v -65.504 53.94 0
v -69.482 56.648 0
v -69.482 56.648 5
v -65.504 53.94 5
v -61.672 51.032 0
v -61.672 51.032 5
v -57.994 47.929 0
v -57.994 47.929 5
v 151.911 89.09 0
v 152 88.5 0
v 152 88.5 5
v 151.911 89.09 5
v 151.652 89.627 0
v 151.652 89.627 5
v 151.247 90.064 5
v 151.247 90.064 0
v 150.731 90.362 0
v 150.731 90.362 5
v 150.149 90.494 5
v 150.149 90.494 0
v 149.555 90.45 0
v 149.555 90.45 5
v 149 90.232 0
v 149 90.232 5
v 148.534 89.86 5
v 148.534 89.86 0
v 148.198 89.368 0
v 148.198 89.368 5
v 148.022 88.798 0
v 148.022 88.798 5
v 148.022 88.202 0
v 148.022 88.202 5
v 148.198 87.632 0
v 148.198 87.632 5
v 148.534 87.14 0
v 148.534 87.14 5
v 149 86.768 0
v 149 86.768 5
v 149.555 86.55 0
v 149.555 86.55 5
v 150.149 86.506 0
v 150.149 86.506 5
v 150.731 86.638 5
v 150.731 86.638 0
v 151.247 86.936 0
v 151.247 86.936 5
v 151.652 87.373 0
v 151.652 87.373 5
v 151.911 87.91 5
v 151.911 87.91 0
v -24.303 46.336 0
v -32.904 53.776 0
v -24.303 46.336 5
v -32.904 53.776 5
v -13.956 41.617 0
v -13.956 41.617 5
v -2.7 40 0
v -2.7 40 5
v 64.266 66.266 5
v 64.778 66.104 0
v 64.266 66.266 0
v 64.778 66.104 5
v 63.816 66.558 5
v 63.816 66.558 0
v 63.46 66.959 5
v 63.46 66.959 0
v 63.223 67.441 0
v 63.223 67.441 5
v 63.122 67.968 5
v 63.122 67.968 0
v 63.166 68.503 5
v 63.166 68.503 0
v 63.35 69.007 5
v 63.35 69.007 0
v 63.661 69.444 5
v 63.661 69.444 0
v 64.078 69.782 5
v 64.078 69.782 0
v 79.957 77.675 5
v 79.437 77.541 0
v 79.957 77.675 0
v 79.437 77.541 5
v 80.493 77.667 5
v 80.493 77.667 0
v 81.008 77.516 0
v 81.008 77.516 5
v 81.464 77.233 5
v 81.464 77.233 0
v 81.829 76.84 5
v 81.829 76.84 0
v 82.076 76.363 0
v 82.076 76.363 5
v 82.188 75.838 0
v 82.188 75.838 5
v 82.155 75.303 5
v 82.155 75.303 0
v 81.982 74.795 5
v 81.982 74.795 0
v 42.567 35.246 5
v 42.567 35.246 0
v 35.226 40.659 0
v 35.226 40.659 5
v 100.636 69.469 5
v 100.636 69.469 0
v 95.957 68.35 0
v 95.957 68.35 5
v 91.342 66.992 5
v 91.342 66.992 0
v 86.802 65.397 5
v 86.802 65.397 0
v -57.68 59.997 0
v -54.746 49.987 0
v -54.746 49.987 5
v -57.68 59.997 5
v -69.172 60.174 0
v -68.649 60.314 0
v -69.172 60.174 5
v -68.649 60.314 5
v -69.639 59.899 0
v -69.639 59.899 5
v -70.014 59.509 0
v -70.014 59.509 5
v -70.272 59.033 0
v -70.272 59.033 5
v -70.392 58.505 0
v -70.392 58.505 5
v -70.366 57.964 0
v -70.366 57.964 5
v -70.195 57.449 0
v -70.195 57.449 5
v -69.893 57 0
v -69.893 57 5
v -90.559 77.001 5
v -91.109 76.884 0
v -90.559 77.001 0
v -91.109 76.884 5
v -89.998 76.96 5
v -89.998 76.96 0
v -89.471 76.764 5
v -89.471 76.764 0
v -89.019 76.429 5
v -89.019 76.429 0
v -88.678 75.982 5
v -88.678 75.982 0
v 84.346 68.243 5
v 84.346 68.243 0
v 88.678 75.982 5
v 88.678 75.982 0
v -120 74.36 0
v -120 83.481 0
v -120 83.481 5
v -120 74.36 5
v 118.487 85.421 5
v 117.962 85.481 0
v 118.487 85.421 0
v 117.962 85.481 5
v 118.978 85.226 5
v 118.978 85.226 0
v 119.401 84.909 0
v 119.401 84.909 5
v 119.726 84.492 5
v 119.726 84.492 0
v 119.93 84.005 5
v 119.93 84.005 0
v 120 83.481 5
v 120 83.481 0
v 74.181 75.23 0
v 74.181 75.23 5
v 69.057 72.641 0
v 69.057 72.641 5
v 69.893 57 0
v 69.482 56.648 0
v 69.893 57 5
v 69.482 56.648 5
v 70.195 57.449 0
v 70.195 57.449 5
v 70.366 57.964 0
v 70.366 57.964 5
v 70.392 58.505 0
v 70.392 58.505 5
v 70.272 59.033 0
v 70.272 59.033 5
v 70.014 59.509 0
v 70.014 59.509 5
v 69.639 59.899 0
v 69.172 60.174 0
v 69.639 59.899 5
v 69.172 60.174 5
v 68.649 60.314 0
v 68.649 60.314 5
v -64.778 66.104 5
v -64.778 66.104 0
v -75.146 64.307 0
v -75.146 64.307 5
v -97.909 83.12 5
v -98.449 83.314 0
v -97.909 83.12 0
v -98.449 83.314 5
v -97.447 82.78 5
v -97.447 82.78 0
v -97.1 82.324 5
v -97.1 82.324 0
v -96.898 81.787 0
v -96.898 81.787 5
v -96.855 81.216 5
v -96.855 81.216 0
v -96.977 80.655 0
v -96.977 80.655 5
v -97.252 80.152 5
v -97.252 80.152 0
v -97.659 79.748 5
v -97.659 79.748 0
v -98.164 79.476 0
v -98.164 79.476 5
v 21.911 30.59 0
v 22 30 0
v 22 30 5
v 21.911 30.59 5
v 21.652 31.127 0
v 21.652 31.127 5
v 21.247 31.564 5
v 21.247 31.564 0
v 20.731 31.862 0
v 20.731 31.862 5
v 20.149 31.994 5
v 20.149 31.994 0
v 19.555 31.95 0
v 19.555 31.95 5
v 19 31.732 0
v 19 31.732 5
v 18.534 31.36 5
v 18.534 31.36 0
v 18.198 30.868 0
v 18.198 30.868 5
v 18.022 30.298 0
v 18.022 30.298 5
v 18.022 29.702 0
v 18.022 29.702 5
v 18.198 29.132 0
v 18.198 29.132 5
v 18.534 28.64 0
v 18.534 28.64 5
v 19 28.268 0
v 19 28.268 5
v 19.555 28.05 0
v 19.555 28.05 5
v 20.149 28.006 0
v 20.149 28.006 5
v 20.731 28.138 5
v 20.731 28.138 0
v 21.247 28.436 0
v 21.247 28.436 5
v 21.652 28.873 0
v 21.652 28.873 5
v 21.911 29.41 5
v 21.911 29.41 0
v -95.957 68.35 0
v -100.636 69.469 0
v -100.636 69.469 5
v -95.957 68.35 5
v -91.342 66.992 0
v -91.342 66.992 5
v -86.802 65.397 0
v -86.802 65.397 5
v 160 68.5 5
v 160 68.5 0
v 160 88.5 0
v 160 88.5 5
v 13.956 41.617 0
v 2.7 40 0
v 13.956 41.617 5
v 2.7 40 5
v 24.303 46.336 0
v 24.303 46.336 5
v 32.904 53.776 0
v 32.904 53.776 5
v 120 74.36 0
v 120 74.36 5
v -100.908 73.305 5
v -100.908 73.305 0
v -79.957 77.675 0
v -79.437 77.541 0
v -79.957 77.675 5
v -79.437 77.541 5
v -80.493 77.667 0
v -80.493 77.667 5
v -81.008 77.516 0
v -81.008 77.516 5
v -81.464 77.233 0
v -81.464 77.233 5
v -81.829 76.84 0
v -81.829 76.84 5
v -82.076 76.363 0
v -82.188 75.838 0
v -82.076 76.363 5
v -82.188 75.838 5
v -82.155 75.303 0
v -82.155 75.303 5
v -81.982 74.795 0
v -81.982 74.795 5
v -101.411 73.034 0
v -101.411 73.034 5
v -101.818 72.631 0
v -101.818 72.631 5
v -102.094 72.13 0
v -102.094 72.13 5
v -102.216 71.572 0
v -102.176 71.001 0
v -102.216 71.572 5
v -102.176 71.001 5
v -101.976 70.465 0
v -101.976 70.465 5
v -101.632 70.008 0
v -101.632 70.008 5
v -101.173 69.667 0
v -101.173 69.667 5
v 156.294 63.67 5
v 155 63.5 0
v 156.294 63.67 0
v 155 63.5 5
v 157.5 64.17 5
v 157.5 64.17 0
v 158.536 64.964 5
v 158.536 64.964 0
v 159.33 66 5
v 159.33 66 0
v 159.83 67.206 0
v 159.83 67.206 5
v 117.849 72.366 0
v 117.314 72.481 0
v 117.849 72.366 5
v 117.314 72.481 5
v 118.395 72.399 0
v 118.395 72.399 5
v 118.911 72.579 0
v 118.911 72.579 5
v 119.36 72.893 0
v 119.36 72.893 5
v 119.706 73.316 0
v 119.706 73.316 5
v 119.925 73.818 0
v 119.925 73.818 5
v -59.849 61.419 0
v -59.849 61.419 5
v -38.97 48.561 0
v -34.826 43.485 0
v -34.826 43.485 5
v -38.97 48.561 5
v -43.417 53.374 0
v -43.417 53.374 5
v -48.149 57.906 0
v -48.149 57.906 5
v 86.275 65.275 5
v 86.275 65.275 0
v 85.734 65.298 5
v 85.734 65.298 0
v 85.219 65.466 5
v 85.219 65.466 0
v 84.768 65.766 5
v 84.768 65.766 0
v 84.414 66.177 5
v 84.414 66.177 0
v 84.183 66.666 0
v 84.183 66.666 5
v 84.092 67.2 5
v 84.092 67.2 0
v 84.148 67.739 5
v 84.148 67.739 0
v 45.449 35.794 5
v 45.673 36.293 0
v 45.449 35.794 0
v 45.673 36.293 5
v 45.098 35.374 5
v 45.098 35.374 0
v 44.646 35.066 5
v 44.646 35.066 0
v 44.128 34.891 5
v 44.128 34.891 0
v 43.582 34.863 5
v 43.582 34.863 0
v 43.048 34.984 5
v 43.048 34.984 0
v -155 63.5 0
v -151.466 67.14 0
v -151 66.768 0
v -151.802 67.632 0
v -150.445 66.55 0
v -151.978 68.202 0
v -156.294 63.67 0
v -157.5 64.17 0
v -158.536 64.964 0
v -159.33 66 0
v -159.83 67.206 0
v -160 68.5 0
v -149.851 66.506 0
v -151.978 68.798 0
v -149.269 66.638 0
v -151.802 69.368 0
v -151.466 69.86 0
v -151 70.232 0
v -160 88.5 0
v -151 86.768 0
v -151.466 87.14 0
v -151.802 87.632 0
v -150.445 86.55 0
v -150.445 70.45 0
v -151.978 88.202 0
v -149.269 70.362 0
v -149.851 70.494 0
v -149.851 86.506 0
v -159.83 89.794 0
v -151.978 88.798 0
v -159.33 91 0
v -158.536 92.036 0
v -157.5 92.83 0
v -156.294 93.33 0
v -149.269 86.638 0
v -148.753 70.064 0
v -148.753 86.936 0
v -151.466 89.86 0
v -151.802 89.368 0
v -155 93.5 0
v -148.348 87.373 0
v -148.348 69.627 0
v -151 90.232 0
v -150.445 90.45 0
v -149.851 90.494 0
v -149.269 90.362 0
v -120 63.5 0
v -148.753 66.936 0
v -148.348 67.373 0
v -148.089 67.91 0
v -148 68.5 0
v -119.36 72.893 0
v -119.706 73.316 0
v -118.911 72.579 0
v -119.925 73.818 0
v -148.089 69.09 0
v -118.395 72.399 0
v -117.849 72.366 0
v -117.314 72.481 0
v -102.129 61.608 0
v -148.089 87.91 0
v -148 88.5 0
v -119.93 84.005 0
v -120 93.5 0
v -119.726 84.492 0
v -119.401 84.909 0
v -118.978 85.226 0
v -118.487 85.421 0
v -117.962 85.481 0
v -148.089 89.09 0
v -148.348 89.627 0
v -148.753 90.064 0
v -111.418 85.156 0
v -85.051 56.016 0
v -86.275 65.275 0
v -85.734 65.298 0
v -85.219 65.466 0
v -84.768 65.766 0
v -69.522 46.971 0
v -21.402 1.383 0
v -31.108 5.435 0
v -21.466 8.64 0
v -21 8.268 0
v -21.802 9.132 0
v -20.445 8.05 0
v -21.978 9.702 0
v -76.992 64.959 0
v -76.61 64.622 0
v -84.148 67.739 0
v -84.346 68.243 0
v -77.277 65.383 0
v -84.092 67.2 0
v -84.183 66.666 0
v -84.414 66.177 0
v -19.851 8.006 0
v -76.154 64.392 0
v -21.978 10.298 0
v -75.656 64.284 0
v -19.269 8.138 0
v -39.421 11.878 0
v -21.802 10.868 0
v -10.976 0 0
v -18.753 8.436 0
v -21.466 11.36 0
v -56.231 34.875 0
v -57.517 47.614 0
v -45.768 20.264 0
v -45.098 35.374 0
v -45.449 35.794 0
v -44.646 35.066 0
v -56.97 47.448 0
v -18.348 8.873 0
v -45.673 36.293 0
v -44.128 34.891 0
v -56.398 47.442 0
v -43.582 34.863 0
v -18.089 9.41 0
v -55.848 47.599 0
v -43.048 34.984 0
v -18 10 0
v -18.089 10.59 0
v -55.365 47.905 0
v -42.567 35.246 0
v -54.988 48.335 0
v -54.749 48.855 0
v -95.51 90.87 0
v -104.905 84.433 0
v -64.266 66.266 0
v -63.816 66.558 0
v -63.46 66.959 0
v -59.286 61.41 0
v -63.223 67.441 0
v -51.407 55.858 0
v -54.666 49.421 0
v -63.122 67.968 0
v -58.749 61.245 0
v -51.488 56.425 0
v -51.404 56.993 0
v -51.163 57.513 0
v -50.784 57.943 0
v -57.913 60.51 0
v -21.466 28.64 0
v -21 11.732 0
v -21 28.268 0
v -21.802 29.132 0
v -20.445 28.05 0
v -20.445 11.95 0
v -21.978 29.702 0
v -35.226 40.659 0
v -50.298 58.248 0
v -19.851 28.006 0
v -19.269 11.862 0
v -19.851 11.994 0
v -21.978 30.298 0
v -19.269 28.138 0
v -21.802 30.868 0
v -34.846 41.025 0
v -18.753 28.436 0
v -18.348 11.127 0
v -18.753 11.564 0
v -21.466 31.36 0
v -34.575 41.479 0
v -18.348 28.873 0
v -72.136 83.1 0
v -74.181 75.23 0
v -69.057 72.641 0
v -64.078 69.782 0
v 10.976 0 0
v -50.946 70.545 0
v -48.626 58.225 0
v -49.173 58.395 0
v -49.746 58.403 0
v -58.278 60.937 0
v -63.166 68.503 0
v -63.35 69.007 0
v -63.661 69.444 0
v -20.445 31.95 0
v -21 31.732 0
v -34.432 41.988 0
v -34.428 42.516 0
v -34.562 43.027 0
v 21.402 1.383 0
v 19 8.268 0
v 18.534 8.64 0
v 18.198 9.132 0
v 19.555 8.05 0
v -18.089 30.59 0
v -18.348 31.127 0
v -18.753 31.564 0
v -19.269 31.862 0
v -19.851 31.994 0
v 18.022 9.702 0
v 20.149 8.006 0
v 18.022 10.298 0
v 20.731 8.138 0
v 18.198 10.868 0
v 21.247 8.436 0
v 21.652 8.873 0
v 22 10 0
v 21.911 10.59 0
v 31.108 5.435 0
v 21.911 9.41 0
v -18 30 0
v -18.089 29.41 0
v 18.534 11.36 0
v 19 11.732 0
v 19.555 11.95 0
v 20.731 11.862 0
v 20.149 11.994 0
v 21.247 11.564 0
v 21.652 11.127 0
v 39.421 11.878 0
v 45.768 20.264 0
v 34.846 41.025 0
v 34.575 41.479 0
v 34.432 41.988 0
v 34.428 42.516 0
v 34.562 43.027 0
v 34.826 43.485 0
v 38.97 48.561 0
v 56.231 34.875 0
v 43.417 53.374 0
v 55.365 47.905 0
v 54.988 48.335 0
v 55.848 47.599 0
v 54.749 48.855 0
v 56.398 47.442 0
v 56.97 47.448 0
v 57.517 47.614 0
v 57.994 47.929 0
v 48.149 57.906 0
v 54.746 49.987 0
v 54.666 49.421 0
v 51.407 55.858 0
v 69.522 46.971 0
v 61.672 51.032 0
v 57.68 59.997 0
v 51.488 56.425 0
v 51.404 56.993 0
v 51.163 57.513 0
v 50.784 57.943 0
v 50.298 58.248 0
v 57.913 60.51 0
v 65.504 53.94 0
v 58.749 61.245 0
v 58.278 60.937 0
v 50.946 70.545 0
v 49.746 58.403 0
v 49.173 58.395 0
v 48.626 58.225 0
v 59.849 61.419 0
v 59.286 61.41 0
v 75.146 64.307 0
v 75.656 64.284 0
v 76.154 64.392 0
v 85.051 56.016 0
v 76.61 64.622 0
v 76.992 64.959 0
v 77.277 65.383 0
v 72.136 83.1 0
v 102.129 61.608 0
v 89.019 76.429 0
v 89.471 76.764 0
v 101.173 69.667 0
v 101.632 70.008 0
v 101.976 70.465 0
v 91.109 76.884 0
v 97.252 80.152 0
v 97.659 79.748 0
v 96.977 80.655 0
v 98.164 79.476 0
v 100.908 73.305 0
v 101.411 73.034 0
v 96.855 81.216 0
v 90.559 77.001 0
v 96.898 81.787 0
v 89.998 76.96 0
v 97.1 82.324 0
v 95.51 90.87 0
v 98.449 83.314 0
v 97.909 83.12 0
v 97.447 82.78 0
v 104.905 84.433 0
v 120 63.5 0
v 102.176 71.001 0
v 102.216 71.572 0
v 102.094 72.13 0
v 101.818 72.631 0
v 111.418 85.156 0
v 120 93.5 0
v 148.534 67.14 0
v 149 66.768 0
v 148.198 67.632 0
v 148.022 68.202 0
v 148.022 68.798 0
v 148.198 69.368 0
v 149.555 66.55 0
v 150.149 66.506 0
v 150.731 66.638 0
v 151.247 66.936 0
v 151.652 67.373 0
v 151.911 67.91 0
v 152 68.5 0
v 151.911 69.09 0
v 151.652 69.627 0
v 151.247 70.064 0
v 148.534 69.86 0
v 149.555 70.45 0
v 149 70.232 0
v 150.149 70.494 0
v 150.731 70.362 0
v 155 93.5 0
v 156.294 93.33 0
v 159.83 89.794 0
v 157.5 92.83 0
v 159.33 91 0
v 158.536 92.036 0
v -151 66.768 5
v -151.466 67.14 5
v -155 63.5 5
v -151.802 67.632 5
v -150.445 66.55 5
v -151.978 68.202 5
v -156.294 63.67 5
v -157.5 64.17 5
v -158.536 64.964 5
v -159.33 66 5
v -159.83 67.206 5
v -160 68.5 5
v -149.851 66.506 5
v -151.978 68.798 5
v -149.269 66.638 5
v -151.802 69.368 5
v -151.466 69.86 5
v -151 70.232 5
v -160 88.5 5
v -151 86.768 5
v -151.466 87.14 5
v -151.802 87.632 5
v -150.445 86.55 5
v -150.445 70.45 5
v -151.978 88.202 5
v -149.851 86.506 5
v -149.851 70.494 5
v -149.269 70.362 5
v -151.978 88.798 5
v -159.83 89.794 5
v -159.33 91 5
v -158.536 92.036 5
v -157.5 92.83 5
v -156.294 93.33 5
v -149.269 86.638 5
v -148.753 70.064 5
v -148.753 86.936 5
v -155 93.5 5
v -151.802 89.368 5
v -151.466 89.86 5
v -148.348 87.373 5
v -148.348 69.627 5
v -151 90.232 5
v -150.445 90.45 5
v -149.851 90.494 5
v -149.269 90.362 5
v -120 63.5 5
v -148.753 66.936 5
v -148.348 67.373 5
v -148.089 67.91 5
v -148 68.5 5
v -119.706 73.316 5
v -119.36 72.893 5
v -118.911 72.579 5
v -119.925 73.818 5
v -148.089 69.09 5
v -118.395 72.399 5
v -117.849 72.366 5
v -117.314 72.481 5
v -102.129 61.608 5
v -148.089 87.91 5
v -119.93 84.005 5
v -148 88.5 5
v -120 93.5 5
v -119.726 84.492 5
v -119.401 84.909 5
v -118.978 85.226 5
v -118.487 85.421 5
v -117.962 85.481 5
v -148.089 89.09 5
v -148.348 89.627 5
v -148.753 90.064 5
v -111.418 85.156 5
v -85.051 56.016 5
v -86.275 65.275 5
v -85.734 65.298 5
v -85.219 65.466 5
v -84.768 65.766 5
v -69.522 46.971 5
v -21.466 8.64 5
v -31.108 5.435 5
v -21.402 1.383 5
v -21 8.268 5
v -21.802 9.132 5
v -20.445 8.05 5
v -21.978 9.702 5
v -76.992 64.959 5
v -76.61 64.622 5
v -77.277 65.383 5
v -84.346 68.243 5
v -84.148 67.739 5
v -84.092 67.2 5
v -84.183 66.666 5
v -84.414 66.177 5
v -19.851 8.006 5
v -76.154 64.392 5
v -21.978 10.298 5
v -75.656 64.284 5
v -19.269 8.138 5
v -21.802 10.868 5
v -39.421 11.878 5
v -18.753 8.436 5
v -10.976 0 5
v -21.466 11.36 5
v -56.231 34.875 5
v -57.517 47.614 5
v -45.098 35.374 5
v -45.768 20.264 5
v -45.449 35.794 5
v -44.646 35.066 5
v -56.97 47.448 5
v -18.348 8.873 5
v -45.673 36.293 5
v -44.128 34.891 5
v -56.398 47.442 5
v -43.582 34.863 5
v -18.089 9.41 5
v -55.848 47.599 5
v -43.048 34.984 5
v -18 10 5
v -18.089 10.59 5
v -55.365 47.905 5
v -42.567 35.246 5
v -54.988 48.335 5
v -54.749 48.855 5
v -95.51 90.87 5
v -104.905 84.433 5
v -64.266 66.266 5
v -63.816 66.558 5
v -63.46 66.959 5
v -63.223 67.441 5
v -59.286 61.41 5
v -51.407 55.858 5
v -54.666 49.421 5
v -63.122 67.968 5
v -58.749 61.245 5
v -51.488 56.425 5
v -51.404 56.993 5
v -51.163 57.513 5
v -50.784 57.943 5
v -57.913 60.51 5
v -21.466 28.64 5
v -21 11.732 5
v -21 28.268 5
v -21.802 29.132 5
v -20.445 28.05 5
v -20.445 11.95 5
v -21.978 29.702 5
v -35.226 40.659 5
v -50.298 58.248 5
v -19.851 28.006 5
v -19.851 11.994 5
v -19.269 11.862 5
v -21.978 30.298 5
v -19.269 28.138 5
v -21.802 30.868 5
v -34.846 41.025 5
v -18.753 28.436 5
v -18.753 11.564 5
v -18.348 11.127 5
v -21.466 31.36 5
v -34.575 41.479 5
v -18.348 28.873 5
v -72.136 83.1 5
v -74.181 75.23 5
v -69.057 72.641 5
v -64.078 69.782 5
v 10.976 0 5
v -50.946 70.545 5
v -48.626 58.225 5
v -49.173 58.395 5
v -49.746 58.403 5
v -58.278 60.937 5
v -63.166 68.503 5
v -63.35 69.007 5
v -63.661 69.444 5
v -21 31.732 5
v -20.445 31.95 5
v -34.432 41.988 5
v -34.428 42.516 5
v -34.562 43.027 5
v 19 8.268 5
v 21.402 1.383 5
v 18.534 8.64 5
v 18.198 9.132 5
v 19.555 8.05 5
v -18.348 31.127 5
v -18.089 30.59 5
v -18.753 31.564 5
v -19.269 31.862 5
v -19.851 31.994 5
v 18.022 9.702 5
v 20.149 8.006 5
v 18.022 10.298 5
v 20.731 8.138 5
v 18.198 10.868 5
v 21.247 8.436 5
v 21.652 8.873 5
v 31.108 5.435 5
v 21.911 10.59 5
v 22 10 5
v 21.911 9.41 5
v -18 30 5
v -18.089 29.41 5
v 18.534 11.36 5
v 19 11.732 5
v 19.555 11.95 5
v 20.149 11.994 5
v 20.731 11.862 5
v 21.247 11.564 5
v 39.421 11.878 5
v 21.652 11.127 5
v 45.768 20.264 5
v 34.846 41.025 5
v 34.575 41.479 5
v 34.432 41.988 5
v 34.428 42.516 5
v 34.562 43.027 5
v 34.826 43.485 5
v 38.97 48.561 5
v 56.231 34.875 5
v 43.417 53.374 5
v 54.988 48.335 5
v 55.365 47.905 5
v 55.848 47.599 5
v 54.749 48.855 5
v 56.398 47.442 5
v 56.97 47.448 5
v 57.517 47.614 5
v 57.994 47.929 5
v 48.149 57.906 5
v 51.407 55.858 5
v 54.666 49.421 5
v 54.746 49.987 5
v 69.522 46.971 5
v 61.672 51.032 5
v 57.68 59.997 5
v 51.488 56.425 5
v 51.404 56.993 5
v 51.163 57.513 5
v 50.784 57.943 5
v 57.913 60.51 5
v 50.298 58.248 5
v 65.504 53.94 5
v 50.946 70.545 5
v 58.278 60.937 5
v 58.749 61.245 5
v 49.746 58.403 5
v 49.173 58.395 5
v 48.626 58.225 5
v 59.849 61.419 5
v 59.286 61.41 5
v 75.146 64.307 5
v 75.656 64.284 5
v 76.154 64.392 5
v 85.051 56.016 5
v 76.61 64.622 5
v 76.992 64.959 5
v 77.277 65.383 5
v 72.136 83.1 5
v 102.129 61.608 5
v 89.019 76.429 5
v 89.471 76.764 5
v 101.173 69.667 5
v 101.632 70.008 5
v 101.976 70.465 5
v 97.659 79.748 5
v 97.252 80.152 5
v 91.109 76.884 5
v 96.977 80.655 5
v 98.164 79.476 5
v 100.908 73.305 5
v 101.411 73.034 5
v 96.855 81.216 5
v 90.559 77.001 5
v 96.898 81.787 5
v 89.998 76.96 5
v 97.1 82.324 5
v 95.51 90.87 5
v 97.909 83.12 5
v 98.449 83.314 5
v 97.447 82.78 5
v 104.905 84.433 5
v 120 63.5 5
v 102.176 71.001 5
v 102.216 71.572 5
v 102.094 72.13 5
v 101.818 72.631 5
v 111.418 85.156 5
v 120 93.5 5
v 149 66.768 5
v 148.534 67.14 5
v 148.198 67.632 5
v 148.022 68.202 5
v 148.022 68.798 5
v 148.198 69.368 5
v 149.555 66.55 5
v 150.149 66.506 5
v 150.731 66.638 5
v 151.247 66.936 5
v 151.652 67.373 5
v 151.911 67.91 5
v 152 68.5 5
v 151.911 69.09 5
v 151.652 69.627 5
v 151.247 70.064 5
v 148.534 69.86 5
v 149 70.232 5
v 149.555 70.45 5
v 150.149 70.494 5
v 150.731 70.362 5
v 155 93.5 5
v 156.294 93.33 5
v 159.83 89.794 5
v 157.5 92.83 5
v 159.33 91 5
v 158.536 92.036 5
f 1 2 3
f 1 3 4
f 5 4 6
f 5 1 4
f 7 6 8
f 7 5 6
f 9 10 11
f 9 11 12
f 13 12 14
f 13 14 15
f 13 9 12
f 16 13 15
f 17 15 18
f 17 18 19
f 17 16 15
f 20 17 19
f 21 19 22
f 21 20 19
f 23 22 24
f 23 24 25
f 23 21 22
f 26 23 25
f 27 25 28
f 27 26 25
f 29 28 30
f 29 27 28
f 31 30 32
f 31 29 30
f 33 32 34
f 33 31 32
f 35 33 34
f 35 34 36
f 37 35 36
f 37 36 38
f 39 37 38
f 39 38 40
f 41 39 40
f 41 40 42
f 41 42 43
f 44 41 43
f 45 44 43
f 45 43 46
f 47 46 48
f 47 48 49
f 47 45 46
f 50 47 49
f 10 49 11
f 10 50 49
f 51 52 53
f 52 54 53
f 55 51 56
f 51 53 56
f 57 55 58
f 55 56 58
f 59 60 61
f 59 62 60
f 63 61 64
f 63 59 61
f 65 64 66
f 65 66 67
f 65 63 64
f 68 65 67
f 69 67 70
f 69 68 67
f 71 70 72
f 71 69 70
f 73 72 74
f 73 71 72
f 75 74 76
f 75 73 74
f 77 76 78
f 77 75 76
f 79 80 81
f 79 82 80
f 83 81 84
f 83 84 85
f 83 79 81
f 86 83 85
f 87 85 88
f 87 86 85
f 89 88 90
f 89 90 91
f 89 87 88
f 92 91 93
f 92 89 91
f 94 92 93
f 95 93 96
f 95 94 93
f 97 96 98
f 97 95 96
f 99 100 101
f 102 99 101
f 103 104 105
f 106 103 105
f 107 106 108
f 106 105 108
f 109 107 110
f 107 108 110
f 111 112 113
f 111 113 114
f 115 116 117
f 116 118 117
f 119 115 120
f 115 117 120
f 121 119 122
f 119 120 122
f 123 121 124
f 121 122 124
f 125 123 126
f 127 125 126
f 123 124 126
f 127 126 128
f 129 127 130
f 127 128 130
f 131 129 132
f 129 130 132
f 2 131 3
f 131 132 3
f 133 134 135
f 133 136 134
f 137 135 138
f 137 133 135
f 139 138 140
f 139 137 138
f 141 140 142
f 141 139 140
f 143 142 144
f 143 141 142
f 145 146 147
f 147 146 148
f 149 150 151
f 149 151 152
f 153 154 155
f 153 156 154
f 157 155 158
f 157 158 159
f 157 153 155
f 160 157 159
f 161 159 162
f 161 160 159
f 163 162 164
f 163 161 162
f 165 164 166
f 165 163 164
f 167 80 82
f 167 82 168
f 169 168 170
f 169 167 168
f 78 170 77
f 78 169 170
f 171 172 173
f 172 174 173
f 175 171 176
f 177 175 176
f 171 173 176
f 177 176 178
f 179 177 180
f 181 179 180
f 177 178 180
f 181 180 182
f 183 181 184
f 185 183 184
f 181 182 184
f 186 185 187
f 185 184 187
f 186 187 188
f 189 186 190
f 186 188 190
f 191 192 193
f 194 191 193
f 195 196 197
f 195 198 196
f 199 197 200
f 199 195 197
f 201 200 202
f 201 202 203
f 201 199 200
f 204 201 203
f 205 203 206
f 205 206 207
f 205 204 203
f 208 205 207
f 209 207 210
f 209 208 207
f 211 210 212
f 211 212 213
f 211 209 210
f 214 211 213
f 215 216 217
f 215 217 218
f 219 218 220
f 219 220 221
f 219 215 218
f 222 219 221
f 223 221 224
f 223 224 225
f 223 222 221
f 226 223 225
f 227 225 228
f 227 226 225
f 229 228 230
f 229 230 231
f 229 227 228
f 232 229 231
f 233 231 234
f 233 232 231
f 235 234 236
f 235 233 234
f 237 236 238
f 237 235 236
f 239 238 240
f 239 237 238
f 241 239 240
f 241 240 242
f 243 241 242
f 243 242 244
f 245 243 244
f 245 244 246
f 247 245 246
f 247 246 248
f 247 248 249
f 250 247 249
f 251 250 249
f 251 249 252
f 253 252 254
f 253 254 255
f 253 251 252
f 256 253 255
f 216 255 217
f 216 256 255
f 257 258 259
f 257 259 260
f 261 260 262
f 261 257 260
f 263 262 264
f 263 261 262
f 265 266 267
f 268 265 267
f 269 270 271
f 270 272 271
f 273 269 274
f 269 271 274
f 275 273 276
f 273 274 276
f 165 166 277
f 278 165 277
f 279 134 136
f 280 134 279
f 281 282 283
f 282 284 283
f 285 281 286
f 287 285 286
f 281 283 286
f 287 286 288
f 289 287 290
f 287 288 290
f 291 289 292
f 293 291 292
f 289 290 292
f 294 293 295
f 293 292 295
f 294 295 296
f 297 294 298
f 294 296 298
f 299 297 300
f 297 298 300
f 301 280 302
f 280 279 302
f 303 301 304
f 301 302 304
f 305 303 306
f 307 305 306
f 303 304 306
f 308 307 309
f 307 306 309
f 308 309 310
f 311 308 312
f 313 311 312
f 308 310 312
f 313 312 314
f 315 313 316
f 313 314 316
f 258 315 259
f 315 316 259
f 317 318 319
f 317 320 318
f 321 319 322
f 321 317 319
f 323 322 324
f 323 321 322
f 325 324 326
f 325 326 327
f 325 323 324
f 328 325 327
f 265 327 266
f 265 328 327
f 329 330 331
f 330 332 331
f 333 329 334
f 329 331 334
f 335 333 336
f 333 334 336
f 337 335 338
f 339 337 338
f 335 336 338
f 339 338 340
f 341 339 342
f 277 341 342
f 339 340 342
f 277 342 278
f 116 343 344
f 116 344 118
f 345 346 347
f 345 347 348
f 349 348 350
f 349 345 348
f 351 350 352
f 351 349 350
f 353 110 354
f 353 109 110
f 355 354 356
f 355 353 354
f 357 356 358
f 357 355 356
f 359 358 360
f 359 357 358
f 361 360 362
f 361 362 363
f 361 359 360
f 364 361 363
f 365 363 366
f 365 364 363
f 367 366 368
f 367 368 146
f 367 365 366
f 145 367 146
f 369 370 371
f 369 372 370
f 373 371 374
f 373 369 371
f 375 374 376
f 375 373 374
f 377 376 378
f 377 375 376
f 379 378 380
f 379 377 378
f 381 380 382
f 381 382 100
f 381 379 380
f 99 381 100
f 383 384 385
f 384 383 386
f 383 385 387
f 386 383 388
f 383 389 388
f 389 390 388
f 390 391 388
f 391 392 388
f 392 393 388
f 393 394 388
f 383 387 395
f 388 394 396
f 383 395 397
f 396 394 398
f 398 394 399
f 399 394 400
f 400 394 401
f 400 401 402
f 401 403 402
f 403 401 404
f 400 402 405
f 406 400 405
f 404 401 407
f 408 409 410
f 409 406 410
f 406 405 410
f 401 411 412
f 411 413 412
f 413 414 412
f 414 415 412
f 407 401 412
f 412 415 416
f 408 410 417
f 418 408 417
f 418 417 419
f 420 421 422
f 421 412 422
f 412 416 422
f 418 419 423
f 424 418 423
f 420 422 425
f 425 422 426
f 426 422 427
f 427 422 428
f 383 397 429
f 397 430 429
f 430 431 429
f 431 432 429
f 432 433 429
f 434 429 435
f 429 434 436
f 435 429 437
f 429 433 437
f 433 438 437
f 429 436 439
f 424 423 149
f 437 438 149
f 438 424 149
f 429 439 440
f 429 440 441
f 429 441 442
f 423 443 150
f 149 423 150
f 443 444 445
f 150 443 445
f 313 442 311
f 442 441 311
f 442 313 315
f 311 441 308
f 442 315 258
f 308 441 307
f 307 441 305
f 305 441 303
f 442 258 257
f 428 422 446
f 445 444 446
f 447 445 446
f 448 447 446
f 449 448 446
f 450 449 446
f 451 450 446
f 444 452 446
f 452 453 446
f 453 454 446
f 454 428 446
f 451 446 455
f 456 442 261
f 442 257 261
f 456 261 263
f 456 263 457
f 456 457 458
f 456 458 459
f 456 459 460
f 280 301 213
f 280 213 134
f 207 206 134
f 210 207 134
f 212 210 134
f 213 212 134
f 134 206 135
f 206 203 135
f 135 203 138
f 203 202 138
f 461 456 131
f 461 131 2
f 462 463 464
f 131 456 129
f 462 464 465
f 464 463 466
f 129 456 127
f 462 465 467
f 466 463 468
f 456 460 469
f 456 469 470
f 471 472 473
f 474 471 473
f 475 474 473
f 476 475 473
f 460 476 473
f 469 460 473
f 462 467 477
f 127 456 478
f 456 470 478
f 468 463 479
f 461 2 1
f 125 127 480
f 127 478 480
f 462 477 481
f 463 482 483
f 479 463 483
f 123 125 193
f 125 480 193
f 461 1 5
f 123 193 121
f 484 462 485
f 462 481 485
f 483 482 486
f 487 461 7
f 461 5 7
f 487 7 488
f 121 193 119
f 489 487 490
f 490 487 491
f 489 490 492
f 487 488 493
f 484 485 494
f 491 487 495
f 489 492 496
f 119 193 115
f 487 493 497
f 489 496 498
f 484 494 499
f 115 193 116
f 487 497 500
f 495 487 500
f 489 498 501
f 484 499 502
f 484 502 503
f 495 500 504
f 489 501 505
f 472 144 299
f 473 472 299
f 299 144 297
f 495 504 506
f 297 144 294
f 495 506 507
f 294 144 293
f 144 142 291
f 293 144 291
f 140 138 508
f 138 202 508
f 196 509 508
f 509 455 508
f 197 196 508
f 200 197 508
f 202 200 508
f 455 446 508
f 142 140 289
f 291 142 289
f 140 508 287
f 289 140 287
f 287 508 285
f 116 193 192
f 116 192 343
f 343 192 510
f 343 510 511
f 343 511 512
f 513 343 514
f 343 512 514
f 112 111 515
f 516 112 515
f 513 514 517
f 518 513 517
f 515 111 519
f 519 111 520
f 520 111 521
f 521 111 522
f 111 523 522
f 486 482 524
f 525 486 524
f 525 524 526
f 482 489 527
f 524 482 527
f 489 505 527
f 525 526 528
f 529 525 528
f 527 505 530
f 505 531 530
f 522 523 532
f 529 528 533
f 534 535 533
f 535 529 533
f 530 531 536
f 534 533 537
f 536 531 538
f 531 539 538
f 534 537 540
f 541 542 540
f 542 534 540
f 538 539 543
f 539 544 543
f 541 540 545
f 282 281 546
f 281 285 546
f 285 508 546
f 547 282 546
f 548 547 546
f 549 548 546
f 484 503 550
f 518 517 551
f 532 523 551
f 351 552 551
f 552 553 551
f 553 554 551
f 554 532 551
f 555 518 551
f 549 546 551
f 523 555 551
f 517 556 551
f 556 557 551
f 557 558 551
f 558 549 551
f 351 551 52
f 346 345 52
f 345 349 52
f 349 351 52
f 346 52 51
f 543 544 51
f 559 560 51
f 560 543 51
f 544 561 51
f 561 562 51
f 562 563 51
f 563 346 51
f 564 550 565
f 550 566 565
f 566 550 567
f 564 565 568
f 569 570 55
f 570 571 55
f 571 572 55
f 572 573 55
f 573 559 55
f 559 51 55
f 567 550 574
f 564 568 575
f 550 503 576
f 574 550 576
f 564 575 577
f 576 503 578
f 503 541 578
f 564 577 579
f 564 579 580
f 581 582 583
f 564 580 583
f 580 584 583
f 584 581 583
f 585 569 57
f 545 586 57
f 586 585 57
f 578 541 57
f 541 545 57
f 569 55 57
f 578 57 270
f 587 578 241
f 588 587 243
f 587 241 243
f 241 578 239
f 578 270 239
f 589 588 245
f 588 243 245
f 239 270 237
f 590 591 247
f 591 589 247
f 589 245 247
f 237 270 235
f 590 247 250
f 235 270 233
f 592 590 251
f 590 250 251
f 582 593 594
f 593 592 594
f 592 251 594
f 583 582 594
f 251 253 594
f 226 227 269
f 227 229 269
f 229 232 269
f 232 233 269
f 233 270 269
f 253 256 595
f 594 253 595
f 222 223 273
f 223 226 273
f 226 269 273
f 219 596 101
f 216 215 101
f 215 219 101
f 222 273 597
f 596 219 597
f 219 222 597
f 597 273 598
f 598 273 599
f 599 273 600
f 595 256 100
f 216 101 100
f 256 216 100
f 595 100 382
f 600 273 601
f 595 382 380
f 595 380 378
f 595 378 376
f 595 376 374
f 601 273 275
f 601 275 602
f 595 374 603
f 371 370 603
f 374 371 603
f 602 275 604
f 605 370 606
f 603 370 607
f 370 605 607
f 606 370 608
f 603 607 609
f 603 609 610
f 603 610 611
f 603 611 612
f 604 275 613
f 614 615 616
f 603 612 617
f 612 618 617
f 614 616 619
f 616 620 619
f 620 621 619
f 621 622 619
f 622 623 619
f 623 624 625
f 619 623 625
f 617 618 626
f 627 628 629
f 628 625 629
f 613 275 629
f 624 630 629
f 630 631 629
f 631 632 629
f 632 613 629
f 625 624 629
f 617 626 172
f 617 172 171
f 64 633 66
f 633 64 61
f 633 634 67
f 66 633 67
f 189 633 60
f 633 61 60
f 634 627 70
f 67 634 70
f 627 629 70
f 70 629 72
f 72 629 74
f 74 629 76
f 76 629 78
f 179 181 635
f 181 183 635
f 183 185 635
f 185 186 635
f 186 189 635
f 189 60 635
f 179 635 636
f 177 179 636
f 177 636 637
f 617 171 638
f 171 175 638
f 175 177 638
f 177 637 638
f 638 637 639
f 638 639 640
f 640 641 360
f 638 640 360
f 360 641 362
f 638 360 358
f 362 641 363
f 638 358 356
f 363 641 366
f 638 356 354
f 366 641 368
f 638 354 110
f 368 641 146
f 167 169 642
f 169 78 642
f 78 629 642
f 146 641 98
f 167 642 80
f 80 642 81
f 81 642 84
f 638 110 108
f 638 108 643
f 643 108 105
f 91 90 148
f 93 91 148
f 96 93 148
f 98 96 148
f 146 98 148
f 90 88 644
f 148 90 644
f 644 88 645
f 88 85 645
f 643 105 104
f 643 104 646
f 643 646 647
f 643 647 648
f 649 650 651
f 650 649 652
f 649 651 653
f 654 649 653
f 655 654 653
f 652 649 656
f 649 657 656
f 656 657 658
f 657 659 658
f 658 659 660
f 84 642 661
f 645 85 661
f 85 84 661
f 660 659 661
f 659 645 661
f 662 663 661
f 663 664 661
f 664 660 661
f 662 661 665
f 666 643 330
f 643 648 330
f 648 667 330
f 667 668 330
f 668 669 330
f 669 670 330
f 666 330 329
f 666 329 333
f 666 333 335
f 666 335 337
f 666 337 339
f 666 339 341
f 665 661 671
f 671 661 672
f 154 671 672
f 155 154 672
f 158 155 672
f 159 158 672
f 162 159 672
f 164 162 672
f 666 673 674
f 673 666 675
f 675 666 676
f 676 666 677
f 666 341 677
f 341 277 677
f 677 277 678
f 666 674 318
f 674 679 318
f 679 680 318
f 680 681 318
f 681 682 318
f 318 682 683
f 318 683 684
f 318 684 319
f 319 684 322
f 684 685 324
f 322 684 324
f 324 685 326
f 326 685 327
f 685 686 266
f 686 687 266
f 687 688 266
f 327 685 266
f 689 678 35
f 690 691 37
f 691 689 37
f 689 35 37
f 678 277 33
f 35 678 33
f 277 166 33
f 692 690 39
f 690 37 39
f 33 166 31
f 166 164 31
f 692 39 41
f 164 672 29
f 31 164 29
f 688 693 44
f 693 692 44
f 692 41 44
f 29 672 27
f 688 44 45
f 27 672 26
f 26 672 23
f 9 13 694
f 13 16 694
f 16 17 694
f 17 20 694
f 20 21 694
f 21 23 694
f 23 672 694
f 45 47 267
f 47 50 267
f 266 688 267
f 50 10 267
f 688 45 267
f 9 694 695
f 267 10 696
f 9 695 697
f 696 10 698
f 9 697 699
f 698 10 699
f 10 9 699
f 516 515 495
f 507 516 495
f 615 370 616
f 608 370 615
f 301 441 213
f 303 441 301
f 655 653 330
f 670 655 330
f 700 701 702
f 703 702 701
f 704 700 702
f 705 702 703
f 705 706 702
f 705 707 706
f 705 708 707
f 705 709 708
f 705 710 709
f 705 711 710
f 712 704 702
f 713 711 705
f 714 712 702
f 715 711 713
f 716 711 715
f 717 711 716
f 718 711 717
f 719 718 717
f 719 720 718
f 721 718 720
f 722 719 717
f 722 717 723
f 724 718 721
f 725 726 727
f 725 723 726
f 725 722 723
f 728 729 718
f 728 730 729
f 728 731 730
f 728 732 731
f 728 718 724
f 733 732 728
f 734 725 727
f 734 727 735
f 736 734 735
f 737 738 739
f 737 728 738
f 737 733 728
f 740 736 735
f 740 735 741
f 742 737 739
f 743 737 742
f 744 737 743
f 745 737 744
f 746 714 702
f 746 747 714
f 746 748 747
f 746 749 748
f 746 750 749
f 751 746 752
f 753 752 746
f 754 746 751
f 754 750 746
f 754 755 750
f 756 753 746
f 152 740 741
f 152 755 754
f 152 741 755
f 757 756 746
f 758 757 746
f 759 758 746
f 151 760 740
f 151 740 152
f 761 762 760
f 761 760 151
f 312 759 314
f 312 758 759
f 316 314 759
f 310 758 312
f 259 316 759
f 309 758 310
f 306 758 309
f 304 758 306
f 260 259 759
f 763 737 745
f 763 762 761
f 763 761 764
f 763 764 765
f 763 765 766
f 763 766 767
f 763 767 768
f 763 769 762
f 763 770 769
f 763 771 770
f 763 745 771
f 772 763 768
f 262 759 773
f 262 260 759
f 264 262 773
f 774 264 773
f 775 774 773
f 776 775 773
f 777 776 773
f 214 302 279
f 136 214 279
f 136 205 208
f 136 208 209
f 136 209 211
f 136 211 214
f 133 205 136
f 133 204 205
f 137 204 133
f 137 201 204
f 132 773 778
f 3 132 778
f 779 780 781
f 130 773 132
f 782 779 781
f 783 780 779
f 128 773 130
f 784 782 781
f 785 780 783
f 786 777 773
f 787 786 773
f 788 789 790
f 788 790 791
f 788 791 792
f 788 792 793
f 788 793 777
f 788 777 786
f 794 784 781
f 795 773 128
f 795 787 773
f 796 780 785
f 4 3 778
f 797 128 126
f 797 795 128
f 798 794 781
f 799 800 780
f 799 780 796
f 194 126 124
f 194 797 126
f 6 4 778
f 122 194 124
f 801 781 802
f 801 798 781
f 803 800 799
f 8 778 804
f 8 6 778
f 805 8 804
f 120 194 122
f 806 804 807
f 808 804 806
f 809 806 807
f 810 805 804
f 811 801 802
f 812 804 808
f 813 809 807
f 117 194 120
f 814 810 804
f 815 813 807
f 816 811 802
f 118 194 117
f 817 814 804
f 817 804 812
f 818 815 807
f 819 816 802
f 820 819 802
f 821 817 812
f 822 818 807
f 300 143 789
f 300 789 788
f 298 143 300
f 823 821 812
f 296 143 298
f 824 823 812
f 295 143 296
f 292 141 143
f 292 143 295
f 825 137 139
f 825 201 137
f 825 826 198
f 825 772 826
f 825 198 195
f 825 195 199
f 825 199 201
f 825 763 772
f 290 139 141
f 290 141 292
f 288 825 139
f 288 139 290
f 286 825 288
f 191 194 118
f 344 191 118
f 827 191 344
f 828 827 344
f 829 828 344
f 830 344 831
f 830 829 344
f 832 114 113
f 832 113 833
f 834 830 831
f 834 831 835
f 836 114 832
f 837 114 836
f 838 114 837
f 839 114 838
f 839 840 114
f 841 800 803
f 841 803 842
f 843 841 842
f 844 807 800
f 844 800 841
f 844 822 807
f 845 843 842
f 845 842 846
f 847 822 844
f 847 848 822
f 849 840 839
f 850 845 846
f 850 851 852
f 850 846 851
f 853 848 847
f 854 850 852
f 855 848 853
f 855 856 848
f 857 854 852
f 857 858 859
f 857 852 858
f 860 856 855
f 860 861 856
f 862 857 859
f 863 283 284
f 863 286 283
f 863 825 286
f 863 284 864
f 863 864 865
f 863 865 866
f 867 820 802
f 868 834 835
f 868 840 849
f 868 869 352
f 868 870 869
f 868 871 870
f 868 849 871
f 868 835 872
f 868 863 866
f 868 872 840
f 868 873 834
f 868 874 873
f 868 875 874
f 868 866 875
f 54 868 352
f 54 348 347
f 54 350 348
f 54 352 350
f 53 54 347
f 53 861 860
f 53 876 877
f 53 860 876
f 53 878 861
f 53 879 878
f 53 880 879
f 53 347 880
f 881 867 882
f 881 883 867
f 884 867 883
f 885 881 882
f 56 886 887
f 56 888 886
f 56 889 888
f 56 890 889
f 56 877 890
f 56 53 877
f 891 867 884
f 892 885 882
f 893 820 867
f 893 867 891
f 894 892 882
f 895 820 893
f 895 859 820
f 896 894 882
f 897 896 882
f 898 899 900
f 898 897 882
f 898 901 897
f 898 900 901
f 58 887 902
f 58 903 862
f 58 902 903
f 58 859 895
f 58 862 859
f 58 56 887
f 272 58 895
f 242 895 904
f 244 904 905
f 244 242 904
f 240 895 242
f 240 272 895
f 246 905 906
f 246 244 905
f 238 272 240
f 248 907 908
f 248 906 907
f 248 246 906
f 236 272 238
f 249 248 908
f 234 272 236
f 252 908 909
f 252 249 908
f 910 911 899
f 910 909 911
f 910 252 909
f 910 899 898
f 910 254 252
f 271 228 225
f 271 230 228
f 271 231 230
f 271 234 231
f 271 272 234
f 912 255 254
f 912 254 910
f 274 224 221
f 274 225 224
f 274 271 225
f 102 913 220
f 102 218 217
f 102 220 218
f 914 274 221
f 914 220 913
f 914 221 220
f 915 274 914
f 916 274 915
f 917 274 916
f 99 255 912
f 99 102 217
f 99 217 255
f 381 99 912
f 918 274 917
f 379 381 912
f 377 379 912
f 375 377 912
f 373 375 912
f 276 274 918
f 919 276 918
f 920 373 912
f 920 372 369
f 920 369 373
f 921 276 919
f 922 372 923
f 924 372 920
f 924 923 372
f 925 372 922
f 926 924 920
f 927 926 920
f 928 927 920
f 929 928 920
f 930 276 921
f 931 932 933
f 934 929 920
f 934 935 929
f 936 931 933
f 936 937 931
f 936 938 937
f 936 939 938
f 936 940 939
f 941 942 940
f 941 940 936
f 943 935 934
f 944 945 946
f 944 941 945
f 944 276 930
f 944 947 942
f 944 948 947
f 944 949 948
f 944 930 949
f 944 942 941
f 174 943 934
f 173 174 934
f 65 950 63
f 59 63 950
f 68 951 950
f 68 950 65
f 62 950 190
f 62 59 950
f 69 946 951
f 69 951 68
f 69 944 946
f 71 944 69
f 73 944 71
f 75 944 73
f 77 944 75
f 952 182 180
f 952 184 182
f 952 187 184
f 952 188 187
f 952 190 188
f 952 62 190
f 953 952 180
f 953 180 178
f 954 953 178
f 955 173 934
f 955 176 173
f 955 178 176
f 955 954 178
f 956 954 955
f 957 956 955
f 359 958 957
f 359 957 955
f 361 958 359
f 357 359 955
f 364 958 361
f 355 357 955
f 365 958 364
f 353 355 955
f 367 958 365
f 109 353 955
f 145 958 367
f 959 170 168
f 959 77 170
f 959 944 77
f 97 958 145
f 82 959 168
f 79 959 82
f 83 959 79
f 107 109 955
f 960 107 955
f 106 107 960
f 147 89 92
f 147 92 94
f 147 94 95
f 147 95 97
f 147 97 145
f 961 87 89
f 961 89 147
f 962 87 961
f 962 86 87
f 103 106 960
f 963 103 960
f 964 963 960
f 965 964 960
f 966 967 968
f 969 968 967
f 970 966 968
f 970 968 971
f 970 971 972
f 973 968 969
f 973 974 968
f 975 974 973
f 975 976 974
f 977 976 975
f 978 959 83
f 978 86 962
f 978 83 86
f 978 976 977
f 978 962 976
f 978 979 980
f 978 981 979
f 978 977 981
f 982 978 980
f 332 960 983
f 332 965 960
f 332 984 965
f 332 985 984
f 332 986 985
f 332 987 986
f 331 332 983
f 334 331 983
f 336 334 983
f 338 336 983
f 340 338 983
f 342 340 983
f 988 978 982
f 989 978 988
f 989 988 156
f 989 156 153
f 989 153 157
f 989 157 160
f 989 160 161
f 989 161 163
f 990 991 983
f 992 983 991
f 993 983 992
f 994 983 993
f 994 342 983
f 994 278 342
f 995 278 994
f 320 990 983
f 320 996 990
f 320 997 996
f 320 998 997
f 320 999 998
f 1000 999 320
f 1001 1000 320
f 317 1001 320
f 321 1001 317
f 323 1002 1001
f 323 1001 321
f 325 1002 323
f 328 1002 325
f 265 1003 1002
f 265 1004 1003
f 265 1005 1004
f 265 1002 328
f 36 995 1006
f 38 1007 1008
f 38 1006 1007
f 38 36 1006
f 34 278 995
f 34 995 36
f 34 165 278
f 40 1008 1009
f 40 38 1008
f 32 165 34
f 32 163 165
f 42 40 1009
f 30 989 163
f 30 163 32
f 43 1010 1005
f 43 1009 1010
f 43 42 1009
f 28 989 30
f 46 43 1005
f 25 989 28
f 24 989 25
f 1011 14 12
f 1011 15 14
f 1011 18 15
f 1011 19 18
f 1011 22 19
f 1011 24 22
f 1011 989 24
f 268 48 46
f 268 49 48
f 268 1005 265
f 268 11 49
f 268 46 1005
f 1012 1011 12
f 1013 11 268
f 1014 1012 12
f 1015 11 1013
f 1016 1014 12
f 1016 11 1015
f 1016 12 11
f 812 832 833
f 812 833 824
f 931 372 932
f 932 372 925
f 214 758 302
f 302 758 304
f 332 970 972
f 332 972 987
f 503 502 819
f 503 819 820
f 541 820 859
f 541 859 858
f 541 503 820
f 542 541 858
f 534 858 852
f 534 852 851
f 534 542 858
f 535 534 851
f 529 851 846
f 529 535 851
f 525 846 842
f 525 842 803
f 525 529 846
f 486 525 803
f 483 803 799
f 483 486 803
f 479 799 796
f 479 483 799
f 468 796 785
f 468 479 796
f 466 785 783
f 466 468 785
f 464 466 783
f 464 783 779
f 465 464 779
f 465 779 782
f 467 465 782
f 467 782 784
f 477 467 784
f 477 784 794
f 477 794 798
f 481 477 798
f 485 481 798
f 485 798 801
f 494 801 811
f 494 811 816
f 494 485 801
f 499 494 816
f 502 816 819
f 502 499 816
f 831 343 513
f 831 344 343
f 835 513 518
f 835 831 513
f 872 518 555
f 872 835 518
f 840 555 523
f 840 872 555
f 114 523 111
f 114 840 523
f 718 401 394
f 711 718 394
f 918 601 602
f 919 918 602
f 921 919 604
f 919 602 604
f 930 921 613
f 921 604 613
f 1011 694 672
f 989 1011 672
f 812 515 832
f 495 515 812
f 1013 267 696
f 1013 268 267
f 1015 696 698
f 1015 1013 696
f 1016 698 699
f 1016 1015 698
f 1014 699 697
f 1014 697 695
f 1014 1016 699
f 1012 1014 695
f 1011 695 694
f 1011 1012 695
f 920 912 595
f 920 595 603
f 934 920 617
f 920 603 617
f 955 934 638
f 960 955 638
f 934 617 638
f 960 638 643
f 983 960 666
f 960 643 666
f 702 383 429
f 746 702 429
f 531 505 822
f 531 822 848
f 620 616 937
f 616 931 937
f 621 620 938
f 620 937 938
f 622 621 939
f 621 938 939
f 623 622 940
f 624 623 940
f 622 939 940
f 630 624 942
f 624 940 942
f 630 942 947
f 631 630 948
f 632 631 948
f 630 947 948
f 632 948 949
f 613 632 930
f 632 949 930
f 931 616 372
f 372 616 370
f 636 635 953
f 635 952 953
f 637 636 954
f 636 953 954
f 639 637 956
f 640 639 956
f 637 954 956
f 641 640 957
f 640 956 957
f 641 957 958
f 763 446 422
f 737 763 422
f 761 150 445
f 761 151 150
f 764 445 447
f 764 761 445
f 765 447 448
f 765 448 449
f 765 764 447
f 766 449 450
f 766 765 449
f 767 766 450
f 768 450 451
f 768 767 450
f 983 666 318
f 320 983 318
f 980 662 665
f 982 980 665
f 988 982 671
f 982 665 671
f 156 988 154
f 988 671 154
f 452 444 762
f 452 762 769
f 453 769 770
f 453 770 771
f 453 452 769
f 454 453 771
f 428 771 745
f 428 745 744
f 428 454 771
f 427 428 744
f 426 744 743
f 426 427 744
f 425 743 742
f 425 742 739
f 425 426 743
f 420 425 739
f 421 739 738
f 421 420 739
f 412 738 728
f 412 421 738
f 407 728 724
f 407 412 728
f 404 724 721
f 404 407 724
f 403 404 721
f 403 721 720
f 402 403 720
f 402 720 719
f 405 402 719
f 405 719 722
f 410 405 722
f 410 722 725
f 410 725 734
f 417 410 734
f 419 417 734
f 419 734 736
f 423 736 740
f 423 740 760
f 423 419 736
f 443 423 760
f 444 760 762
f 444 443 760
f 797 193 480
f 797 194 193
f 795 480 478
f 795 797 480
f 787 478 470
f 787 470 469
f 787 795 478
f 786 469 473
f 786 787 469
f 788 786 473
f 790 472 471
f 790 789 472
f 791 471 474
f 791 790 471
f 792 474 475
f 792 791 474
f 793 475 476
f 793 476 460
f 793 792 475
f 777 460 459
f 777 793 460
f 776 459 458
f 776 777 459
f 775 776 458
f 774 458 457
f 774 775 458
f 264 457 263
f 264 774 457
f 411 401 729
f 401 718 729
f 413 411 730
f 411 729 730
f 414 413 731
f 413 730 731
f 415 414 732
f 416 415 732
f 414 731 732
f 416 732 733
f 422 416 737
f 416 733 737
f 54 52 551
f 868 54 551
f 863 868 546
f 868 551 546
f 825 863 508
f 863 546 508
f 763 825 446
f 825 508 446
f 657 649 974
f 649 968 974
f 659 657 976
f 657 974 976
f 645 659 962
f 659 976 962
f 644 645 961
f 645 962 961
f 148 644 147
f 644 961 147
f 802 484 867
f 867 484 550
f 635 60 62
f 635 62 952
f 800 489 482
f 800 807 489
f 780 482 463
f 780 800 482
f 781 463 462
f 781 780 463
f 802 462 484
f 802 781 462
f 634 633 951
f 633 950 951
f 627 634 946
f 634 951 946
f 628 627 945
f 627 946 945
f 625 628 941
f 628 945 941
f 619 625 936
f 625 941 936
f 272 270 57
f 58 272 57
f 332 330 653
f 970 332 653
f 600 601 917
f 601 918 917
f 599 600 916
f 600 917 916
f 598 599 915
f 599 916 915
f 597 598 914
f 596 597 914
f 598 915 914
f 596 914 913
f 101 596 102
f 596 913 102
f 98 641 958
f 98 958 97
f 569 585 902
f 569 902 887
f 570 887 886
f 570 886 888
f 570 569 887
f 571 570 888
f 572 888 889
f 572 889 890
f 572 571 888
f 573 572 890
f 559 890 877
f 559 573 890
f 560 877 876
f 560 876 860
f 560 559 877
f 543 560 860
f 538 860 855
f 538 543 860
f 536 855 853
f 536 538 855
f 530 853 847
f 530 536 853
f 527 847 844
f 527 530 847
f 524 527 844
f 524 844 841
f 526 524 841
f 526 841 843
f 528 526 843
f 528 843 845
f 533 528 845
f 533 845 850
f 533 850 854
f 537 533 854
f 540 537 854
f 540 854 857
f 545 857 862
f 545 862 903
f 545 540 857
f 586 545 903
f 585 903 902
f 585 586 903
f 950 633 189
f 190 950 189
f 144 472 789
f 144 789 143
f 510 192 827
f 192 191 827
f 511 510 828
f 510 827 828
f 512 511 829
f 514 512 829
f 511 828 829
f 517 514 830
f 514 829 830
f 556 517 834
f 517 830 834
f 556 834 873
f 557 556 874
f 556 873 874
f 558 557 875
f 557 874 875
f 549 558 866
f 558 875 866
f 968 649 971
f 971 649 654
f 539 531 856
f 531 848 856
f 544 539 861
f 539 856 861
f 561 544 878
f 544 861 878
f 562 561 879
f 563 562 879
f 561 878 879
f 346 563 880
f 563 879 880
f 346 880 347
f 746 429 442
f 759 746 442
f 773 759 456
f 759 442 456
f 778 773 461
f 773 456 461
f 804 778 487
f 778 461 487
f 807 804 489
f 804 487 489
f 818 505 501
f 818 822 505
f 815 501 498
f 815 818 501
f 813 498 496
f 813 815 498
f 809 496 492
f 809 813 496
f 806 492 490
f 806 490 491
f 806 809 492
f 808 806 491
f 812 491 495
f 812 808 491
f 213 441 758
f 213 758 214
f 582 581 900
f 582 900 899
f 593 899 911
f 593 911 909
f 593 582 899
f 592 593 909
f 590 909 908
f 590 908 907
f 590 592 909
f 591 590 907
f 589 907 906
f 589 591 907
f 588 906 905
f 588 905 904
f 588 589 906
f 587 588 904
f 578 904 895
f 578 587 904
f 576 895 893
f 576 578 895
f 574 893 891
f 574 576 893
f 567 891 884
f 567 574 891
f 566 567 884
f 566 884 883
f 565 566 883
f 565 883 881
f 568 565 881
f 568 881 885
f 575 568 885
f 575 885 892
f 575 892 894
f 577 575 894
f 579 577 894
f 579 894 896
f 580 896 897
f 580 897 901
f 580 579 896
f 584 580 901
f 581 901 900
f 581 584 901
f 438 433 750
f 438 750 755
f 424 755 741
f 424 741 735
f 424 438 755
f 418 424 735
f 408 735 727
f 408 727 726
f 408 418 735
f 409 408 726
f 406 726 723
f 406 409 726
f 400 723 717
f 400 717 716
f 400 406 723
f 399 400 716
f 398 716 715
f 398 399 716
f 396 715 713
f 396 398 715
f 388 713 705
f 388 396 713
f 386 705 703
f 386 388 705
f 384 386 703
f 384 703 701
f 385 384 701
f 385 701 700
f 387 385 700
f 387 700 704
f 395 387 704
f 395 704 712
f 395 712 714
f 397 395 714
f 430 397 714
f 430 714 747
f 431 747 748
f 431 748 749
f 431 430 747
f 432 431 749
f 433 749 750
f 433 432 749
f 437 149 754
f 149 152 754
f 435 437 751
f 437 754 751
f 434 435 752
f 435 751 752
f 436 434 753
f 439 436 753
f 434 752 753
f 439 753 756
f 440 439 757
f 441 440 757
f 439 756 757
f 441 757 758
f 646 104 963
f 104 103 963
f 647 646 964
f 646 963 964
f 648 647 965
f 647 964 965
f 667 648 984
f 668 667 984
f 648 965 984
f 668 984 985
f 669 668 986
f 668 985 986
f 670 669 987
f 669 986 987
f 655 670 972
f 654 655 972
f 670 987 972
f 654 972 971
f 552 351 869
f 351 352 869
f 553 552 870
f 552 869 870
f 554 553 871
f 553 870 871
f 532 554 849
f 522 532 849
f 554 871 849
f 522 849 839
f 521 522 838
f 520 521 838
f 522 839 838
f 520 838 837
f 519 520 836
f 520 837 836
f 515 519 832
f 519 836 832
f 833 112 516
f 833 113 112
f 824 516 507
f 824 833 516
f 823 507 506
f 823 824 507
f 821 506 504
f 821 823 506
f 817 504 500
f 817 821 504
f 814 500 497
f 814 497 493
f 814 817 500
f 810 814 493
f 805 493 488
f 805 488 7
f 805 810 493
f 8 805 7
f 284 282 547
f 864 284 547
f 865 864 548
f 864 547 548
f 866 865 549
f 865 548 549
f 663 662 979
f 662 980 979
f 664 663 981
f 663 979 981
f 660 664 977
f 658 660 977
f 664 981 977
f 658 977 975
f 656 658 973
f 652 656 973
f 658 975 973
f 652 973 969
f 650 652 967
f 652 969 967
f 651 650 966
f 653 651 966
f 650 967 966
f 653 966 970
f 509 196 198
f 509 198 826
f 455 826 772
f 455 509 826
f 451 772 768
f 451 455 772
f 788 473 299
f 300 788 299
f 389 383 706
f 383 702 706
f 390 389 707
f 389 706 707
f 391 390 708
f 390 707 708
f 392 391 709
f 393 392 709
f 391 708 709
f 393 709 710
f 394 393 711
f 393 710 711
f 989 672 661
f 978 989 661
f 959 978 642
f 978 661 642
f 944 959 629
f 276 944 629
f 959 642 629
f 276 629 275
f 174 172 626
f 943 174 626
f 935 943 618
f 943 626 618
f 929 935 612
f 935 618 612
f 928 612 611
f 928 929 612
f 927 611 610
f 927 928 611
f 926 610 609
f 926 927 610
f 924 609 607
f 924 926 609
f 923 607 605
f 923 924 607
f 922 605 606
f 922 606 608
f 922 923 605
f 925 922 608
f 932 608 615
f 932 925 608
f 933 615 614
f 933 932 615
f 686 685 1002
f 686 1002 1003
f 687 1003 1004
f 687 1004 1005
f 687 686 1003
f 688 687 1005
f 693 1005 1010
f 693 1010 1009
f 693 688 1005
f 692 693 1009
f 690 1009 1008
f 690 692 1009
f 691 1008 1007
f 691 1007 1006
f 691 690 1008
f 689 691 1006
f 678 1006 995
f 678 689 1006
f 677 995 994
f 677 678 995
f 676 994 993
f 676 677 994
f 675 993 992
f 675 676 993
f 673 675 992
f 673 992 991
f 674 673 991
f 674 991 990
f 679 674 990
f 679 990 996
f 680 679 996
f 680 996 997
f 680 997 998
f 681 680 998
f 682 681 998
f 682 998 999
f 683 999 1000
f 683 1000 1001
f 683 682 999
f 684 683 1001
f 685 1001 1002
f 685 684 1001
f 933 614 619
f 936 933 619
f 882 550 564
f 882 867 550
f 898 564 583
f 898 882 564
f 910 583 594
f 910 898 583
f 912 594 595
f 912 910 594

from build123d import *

# Parameters (mm, degrees)
ESQUISSE1_R        = 2
BOSS_EXTRU_1_DEPTH = 5
CONG_1_R           = 5
CONG_2_R           = 40
CONG_3_R           = 2


with BuildPart() as part:
    # Esquisse1 → Boss.-Extru.1 (new body)
    with BuildSketch(Plane.XY):
        with BuildLine():
            Line((-37.5, 0), (37.5, 0))
            ThreePointArc((37.5, 0), (67.945941561, 45.786768838), (120, 63.5))
            Line((120, 63.5), (160, 63.5))
            Line((160, 63.5), (160, 93.5))
            Line((160, 93.5), (120, 93.5))
            ThreePointArc((120, 93.5), (64.453511348, 79.243999919), (22.637791694, 40))
            Line((22.637791694, 40), (-22.637791694, 40))
            ThreePointArc((-22.637791694, 40), (-64.453511348, 79.243999919), (-120, 93.5))
            Line((-120, 93.5), (-160, 93.5))
            Line((-160, 93.5), (-160, 63.5))
            Line((-160, 63.5), (-120, 63.5))
            ThreePointArc((-120, 63.5), (-67.945941561, 45.786768838), (-37.5, 0))
        make_face()
        with Locations((20, 30)):
            Circle(ESQUISSE1_R, mode=Mode.SUBTRACT)
        with Locations((-20, 30)):
            Circle(ESQUISSE1_R, mode=Mode.SUBTRACT)
        with Locations((-20, 10)):
            Circle(ESQUISSE1_R, mode=Mode.SUBTRACT)
        with Locations((20, 10)):
            Circle(ESQUISSE1_R, mode=Mode.SUBTRACT)
        with Locations((150, 88.5)):
            Circle(ESQUISSE1_R, mode=Mode.SUBTRACT)
        with Locations((150, 68.5)):
            Circle(ESQUISSE1_R, mode=Mode.SUBTRACT)
        with Locations((-150, 88.5)):
            Circle(ESQUISSE1_R, mode=Mode.SUBTRACT)
        with Locations((-150, 68.5)):
            Circle(ESQUISSE1_R, mode=Mode.SUBTRACT)
        with BuildLine():
            Line((120, 85.5), (120, 71.5))
            Line((120, 71.5), (91.912412909, 81.760105686))
            ThreePointArc((91.912412909, 81.760105686), (105.832260607, 84.560918666), (120, 85.5))
        make_face(mode=Mode.SUBTRACT)
        with BuildLine():
            Line((44.869226881, 33.548751393), (33.600720018, 41.856624351))
            ThreePointArc((33.600720018, 41.856624351), (42.763993121, 52.702874362), (53.278657874, 62.244810141))
            Line((53.278657874, 62.244810141), (44.869226881, 33.548751393))
        make_face(mode=Mode.SUBTRACT)
        with BuildLine():
            Line((52.630031511, 42.764858585), (58.158997811, 61.631716745))
            Line((58.158997811, 61.631716745), (74.382302486, 59.593661799))
            ThreePointArc((74.382302486, 59.593661799), (62.882968201, 51.984783256), (52.630031511, 42.764858585))
        make_face(mode=Mode.SUBTRACT)
        with BuildLine():
            Line((59.726445752, 66.980423245), (76.611394643, 64.052400369))
            Line((76.611394643, 64.052400369), (84.274506387, 79.380529263))
            ThreePointArc((84.274506387, 79.380529263), (71.601705042, 73.969909454), (59.726445752, 66.980423245))
        make_face(mode=Mode.SUBTRACT)
        with BuildLine():
            Line((81.522990402, 63.200679417), (89.509798834, 77.468130963))
            Line((89.509798834, 77.468130963), (107.976603852, 70.722397677))
            ThreePointArc((107.976603852, 70.722397677), (94.471255289, 67.941160205), (81.522990402, 63.200679417))
        make_face(mode=Mode.SUBTRACT)
        with BuildLine():
            Line((-120, 85.5), (-120, 71.5))
            Line((-120, 71.5), (-91.912412909, 81.760105686))
            ThreePointArc((-91.912412909, 81.760105686), (-105.832260607, 84.560918666), (-120, 85.5))
        make_face(mode=Mode.SUBTRACT)
        with BuildLine():
            Line((-89.509798834, 77.468130963), (-107.976603852, 70.722397677))
            ThreePointArc((-107.976603852, 70.722397677), (-94.471255289, 67.941160205), (-81.522990402, 63.200679417))
            Line((-81.522990402, 63.200679417), (-89.509798834, 77.468130963))
        make_face(mode=Mode.SUBTRACT)
        with BuildLine():
            Line((-76.611394643, 64.052400369), (-84.274506387, 79.380529263))
            ThreePointArc((-84.274506387, 79.380529263), (-71.601705042, 73.969909454), (-59.726445752, 66.980423245))
            Line((-59.726445752, 66.980423245), (-76.611394643, 64.052400369))
        make_face(mode=Mode.SUBTRACT)
        with BuildLine():
            Line((-58.158997811, 61.631716745), (-74.382302486, 59.593661799))
            ThreePointArc((-74.382302486, 59.593661799), (-62.882968201, 51.984783256), (-52.630031511, 42.764858585))
            Line((-52.630031511, 42.764858585), (-58.158997811, 61.631716745))
        make_face(mode=Mode.SUBTRACT)
        with BuildLine():
            Line((-44.869226881, 33.548751393), (-33.600720018, 41.856624351))
            ThreePointArc((-33.600720018, 41.856624351), (-42.763993121, 52.702874362), (-53.278657874, 62.244810141))
            Line((-53.278657874, 62.244810141), (-44.869226881, 33.548751393))
        make_face(mode=Mode.SUBTRACT)
    extrude(amount=BOSS_EXTRU_1_DEPTH)

    # Congé1
    cong_1_edges = [part.edges().sort_by_distance(p)[0] for p in [
        (160, 93.5, 2.5),
        (160, 63.5, 2.5),
        (-160, 63.5, 2.5),
        (-160, 93.5, 2.5),
    ]]
    fillet(cong_1_edges, radius=CONG_1_R)

    # Congé2
    cong_2_edges = [part.edges().sort_by_distance(p)[0] for p in [
        (-22.637791694, 40, 2.5),
        (22.637791694, 40, 2.5),
        (37.5, 0, 2.5),
        (-37.5, 0, 2.5),
    ]]
    fillet(cong_2_edges, radius=CONG_2_R)

    # Congé3
    cong_3_edges = [part.edges().sort_by_distance(p)[0] for p in [
        (-58.158997811, 61.631716745, 2.5),
        (-74.382302486, 59.593661799, 2.5),
        (-52.630031511, 42.764858585, 2.5),
        (-76.611394643, 64.052400369, 2.5),
        (-59.726445752, 66.980423245, 2.5),
        (-84.274506387, 79.380529263, 2.5),
        (-120, 71.5, 2.5),
        (-91.912412909, 81.760105686, 2.5),
        (-120, 85.5, 2.5),
        (89.509798834, 77.468130963, 2.5),
        (81.522990402, 63.200679417, 2.5),
        (107.976603852, 70.722397677, 2.5),
        (44.869226881, 33.548751393, 2.5),
        (53.278657874, 62.244810141, 2.5),
        (33.600720018, 41.856624351, 2.5),
        (59.726445752, 66.980423245, 2.5),
        (76.611394643, 64.052400369, 2.5),
        (84.274506387, 79.380529263, 2.5),
        (91.912412909, 81.760105686, 2.5),
        (120, 71.5, 2.5),
        (120, 85.5, 2.5),
        (74.382302486, 59.593661799, 2.5),
        (58.158997811, 61.631716745, 2.5),
        (52.630031511, 42.764858585, 2.5),
        (-81.522990402, 63.200679417, 2.5),
        (-89.509798834, 77.468130963, 2.5),
        (-107.976603852, 70.722397677, 2.5),
        (-53.278657874, 62.244810141, 2.5),
        (-44.869226881, 33.548751393, 2.5),
        (-33.600720018, 41.856624351, 2.5),
    ]]
    fillet(cong_3_edges, radius=CONG_3_R)


solid = part.part
